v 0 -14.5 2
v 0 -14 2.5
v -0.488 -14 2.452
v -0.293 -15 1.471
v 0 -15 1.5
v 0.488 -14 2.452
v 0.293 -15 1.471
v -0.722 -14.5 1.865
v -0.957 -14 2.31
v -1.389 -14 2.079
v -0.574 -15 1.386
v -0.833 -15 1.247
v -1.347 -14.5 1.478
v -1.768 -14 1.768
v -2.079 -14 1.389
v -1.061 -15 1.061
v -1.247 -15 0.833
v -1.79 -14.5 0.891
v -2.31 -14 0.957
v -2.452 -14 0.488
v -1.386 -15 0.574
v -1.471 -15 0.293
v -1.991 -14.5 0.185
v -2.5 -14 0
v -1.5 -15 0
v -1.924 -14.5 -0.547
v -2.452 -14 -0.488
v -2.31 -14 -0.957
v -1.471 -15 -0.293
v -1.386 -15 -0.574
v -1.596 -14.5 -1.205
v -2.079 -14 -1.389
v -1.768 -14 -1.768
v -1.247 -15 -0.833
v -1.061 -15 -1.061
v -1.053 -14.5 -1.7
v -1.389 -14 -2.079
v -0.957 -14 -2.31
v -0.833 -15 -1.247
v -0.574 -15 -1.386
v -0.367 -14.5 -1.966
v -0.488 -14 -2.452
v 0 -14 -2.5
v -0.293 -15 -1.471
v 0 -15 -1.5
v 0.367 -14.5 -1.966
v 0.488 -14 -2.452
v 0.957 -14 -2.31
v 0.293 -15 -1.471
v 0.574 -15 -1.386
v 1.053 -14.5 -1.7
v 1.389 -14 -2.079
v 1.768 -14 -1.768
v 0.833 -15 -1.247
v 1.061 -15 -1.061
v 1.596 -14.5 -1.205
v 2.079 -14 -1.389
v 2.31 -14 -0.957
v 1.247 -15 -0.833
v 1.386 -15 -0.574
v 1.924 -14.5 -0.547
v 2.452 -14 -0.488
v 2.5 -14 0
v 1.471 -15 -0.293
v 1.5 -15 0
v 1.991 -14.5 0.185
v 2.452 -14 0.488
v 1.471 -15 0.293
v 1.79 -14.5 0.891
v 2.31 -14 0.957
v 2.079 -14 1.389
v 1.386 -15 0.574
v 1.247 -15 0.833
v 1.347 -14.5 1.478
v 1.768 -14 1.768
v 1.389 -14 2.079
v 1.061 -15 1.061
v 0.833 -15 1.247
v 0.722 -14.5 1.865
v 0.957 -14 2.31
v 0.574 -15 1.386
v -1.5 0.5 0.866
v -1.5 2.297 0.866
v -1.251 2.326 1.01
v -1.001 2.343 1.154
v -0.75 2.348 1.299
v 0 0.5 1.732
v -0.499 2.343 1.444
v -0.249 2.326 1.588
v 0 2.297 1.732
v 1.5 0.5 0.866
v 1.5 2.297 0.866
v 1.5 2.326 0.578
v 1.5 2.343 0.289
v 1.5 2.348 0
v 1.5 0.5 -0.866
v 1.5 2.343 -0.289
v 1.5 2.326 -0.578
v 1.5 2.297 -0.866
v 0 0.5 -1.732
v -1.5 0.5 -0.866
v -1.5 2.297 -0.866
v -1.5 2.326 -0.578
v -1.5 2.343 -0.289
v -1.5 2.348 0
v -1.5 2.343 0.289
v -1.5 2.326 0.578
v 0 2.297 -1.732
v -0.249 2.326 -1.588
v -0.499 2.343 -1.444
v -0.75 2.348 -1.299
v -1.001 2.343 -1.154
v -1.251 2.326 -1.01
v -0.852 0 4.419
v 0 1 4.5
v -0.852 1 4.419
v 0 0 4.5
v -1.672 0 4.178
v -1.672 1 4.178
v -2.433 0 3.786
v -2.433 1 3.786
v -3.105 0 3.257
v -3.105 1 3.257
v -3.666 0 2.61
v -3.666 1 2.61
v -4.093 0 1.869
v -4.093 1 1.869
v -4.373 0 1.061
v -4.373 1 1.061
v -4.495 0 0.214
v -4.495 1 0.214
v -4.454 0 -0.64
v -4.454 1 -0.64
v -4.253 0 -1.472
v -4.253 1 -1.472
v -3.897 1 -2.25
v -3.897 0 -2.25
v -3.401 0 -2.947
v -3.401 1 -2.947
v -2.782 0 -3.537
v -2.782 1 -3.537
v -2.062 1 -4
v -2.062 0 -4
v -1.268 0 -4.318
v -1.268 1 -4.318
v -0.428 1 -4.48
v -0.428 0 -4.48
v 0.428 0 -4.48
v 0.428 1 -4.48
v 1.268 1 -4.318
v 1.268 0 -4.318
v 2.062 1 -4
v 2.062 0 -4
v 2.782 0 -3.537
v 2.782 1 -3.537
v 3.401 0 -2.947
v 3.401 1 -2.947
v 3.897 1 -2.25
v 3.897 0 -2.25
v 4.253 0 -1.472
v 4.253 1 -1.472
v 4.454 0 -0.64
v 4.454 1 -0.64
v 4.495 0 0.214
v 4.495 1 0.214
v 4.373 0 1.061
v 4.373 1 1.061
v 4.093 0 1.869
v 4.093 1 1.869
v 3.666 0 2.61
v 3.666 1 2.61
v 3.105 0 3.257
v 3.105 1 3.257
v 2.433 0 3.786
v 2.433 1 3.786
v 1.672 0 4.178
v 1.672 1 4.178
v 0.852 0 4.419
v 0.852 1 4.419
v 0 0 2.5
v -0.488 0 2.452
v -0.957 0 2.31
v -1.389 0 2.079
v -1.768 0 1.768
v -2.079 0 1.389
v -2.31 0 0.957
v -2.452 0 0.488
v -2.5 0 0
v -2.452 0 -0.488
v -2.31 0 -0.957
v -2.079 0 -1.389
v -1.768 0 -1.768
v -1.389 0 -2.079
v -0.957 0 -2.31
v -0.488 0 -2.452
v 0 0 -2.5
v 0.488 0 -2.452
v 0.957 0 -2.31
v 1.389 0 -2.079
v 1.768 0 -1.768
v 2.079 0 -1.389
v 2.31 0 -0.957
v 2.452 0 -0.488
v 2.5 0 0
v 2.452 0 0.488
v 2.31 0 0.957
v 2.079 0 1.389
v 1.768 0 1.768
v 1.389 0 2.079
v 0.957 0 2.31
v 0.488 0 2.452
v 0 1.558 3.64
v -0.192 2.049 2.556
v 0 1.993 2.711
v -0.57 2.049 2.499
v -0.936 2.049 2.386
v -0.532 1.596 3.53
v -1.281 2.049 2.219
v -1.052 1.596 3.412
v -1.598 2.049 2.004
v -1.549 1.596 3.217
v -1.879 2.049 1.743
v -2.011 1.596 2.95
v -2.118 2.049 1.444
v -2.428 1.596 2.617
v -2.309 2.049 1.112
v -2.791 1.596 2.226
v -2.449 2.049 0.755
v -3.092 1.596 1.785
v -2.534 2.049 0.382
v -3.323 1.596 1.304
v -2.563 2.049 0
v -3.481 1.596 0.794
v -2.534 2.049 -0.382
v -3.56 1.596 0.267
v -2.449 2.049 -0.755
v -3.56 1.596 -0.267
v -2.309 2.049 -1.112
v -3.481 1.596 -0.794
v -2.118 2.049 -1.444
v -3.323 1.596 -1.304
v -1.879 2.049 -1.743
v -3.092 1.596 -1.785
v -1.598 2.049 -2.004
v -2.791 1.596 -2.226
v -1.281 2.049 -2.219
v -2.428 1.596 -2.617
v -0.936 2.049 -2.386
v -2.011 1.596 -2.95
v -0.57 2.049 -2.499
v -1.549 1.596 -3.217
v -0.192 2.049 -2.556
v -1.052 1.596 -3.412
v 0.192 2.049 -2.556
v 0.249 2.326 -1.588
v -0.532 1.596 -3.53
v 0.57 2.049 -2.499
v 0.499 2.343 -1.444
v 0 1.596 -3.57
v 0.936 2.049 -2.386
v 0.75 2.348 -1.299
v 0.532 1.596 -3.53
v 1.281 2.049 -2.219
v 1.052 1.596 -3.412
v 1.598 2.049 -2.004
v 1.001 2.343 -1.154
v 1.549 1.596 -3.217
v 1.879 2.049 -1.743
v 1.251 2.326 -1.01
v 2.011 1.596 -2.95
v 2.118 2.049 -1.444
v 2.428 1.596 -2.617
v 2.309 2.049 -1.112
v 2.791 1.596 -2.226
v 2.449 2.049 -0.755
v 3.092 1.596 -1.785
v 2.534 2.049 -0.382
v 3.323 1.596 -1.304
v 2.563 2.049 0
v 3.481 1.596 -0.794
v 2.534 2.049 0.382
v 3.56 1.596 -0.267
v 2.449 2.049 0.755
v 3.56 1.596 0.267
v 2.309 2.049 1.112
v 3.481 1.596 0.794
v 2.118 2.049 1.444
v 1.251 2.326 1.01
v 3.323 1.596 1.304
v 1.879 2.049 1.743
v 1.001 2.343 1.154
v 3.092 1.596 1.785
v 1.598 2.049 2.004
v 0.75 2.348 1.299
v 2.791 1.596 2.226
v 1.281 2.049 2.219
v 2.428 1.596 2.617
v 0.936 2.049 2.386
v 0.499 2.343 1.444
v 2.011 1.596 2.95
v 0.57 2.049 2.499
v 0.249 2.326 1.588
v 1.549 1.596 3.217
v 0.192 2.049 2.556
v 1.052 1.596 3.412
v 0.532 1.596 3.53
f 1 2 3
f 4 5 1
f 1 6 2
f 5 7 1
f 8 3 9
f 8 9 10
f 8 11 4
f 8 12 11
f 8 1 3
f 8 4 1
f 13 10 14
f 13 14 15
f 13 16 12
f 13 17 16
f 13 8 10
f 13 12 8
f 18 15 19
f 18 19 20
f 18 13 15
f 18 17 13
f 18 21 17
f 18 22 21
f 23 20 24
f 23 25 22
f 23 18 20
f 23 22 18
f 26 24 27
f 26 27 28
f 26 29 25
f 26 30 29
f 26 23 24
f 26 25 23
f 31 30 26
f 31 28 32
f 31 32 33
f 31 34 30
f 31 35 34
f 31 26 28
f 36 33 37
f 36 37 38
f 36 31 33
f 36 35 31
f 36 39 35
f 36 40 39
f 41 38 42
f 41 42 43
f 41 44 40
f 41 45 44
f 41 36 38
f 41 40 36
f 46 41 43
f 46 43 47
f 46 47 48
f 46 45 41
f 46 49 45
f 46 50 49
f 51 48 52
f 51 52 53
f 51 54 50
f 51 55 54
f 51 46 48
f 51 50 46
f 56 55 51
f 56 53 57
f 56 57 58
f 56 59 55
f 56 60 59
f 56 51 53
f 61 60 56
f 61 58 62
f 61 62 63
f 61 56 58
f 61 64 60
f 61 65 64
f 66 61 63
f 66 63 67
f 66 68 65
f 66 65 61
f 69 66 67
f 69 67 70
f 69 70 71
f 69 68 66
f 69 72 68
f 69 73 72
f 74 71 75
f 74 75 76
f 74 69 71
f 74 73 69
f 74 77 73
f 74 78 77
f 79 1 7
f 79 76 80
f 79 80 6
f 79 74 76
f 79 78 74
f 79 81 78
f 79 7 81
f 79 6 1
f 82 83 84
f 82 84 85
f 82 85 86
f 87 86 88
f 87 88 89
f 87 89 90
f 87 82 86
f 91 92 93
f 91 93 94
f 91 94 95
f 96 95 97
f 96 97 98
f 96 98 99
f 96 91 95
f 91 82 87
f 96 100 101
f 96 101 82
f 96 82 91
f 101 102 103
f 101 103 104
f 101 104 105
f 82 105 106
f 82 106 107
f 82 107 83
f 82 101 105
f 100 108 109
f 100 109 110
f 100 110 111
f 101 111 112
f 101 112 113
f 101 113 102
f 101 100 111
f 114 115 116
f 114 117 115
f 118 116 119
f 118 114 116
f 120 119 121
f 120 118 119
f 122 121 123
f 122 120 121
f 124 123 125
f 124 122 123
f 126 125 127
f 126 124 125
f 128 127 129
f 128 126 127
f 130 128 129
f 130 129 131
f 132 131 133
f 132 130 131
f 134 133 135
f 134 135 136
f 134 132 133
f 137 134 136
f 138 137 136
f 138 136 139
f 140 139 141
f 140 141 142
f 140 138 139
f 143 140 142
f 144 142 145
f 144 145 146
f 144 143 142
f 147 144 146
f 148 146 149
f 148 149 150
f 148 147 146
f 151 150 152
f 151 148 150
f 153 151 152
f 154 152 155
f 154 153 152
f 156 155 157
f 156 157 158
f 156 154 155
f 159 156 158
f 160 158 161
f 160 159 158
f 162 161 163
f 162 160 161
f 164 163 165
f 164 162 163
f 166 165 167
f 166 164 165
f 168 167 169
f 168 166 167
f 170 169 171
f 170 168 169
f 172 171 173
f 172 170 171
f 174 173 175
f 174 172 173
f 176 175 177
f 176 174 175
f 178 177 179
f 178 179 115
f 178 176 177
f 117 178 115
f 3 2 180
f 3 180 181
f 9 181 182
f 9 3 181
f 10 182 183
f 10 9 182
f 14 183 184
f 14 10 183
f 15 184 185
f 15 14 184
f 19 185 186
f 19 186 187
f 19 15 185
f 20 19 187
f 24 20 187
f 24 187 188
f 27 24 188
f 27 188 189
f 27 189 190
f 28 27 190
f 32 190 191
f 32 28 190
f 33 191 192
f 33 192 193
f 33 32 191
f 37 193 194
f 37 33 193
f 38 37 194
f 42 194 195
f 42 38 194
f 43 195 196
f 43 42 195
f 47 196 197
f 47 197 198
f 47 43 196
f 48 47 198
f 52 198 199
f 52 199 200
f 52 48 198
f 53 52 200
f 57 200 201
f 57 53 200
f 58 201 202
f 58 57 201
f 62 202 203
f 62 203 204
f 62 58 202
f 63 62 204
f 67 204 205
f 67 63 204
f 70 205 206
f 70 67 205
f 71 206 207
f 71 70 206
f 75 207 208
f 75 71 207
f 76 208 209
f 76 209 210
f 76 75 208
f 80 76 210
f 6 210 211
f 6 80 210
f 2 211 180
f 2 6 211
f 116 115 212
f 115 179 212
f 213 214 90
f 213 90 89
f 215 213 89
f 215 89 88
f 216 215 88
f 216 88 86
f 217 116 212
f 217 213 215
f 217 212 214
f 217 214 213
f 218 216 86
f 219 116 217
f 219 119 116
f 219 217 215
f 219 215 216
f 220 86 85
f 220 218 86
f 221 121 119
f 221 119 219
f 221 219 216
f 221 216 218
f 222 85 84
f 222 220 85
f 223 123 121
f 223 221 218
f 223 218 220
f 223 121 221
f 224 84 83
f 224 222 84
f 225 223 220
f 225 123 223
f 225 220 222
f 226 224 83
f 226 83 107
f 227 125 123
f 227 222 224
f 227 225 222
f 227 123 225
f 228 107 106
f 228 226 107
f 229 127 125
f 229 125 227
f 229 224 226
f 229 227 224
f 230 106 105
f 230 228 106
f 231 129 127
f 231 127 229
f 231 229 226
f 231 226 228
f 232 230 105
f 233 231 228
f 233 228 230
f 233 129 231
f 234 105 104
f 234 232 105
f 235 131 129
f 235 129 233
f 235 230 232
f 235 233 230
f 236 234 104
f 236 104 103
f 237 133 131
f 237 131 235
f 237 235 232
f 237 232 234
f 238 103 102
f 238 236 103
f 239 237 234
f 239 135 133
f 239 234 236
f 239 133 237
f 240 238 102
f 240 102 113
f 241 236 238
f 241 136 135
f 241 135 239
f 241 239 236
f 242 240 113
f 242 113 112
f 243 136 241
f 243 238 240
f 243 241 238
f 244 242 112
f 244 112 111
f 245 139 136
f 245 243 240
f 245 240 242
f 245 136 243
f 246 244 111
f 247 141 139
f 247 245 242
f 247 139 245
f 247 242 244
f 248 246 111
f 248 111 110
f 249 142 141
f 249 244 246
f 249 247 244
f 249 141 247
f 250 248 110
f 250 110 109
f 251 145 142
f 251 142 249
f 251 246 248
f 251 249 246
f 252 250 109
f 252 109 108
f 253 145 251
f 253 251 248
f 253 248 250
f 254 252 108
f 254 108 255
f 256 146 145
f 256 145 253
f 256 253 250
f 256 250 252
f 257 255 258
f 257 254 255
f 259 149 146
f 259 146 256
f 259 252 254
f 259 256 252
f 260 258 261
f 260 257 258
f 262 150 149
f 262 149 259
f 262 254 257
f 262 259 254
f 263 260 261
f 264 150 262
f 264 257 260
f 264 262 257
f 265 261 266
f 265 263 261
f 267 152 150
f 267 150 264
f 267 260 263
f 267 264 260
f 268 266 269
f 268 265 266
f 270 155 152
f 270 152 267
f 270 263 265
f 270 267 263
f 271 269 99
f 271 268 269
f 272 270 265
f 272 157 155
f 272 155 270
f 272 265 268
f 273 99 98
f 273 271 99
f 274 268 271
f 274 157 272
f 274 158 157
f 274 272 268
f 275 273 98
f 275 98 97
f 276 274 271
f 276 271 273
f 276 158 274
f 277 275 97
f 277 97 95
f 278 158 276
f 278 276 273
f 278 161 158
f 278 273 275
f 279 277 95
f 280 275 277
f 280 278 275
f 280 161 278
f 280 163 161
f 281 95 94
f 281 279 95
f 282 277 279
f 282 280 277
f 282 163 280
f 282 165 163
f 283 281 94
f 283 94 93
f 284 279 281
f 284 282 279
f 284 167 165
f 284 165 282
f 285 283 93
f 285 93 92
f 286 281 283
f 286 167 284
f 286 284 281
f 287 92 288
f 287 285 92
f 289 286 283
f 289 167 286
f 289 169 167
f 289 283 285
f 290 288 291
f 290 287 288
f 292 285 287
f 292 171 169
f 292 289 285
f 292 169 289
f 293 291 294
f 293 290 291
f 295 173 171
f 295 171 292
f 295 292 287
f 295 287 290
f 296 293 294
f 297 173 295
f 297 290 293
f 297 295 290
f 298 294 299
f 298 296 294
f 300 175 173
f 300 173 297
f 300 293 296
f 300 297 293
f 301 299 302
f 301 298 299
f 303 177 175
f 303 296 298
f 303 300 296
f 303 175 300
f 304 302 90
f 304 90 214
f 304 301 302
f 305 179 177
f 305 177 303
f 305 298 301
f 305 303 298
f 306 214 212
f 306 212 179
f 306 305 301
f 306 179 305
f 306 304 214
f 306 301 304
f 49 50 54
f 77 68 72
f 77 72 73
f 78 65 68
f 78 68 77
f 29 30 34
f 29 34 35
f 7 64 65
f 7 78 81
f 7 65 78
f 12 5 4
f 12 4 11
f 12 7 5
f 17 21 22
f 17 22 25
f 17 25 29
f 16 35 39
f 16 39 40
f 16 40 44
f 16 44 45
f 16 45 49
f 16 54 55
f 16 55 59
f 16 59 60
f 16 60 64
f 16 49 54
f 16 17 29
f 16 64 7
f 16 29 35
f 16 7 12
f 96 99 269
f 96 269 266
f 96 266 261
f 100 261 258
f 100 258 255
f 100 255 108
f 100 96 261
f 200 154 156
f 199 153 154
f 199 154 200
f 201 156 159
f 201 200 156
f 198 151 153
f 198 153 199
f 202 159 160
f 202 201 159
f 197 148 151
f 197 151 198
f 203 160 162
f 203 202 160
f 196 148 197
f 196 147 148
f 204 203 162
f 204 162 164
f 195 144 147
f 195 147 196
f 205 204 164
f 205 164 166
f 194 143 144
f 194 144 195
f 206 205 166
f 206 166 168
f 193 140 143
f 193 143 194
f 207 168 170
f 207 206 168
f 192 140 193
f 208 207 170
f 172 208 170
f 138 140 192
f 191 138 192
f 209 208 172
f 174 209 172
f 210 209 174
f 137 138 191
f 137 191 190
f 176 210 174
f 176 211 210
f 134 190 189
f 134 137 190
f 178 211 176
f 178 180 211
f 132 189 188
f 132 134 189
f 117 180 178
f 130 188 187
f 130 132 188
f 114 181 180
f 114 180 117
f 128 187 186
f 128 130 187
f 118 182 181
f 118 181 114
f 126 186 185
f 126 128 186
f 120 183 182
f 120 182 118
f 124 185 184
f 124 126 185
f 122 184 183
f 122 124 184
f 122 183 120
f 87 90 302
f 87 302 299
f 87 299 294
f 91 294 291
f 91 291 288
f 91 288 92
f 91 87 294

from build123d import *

# Parameters (mm, degrees)
ENL_V_START             = 0.5
ENL_V_MAT_EXTRU_1_DEPTH = 3
CHANFREIN1_SIZE         = 1


with BuildPart() as part:
    # Esquisse1 → Révolution1 (revolve)
    with BuildSketch(Plane.XY, mode=Mode.PRIVATE) as r_volution1_sk:
        with BuildLine():
            Line((0, -15), (0, 2.5))
            ThreePointArc((0, 2.5), (-2.371708245, 2.115124735), (-4.5, 1))
            Line((-4.5, 1), (-4.5, 0))
            Line((-4.5, 0), (-2.5, 0))
            Line((-2.5, 0), (-2.5, -15))
            Line((-2.5, -15), (0, -15))
        make_face()
    revolve(r_volution1_sk.sketch.rotate(Axis((0, 16.1829806, 0), (0, -1, 0)), 270), axis=Axis((0, 16.1829806, 0), (0, -1, 0)))  # turned: the seam where the file's is

    # Esquisse2 → Enlèv. mat.-Extru.1 (cut, through all)
    with BuildSketch(Plane(origin=(0, 0, 0), x_dir=(1, 0, 0), z_dir=(0, 1, 0)).offset(ENL_V_START)):
        Polygon((0, 1.732050808), (-1.5, 0.866025404), (-1.5, -0.866025404), (0, -1.732050808), (1.5, -0.866025404), (1.5, 0.866025404), align=None)
    extrude(amount=ENL_V_MAT_EXTRU_1_DEPTH, mode=Mode.SUBTRACT)

    # Chanfrein1
    chanfrein1_edges = [part.edges().sort_by_distance(p)[0] for p in [
        (0, -15, -2.5),
    ]]
    chamfer(chanfrein1_edges, length=CHANFREIN1_SIZE)


solid = part.part
